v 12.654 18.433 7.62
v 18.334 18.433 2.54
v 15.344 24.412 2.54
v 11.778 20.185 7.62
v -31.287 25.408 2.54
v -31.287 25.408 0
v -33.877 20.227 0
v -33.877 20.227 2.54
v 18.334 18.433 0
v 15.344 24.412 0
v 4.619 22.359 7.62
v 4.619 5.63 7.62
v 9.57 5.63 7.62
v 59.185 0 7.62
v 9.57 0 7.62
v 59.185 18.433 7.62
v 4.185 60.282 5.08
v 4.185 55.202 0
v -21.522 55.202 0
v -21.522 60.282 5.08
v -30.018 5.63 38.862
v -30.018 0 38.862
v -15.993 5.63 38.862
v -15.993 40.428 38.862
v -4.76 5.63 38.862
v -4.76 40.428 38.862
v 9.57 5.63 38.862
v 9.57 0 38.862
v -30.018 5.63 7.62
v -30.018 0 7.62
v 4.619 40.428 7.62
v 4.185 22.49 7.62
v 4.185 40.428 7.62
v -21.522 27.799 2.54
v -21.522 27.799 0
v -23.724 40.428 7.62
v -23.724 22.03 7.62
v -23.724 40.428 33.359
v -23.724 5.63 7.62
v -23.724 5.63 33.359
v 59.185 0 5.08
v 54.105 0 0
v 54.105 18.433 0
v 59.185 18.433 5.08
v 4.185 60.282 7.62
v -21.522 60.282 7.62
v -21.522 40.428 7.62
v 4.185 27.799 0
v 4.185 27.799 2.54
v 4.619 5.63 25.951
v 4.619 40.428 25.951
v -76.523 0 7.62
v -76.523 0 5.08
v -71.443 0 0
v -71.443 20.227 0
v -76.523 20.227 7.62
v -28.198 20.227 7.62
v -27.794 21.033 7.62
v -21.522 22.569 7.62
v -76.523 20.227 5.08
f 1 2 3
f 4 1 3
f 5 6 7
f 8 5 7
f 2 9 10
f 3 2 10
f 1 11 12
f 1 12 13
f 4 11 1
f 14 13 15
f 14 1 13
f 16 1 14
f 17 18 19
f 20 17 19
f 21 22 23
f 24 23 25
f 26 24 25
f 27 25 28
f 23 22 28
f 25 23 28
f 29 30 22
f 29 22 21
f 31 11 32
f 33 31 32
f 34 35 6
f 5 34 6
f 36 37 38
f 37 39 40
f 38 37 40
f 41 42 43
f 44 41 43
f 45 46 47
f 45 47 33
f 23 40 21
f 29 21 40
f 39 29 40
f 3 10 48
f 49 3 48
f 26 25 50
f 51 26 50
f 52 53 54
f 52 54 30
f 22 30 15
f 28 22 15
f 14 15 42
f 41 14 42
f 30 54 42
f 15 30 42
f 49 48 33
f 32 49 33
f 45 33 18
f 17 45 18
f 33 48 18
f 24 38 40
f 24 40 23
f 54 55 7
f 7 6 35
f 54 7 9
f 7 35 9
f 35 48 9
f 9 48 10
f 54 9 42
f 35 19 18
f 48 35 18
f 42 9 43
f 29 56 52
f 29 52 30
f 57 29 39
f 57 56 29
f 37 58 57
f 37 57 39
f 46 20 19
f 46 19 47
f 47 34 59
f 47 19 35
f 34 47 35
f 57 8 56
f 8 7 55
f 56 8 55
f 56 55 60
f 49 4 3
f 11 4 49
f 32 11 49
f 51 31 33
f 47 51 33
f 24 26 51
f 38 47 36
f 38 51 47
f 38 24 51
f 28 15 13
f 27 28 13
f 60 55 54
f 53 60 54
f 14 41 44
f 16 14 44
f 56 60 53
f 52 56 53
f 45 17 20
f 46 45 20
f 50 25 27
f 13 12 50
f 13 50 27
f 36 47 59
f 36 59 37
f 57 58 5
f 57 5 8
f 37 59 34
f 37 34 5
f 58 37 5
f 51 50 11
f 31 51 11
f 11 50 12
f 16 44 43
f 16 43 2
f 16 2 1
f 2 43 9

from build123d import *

# Parameters (mm, degrees)
F1_DEPTH = 7.62
F2_SIZE  = 5.08
F3_W     = 39.5873952657
F3_H     = 5.6298854761
F4_DEPTH = 31.242
F6_DEPTH = 34.798


with BuildPart() as f1:
    # F0 (on Top) → F1 (new body)
    with BuildSketch(Plane.XY):
        Polygon((-76.5226408839, 20.2266871929), (-76.5226408839, 0), (59.1854825616, 0), (59.1854825616, 18.4331871569), (18.3335505426, 18.4331871569), (15.344383195, 24.4115199894), (4.1848318651, 27.7992393821), (4.1848318651, 60.2815076709), (-21.5219929814, 60.2815076709), (-21.5219929814, 27.7992393821), (-31.2866009772, 25.4079084843), (-33.8772125542, 20.2266871929), align=None)
    extrude(amount=F1_DEPTH)

    # F2
    f2_edges = [f1.edges().sort_by_distance(p)[0] for p in [
        (-26.404297, 26.603574, 7.62),
        (-32.581907, 22.817298, 7.62),
        (9.764608, 26.10538, 7.62),
        (16.838967, 21.422354, 7.62),
        (59.185483, 9.216594, 0),
        (-76.522641, 10.113344, 0),
        (-8.668581, 60.281508, 0),
    ]]
    chamfer(f2_edges, length=F2_SIZE)

    # F3 (on face) → F4 (join)
    with BuildSketch(Plane.XY.offset(7.62)):
        with Locations((-10.2241346613, 2.814942738)):
            Rectangle(F3_W, F3_H)
    extrude(amount=F4_DEPTH)

    # F5 (on face) → F6 (join)
    with BuildSketch(Plane(origin=(0, 5.6298854761, 0), x_dir=(-1, 0, 0), z_dir=(0, 1, 0))):
        Polygon((-4.6187778935, 25.9514674544), (-4.6187778935, 7.62), (0, 7.62), (0, 23.0201836675), (4.759604577, 29.3508209288), (15.9931536764, 29.3508209288), (19.8779646307, 25.9514674544), (19.8779646307, 7.62), (23.7236581743, 7.62), (23.7236581743, 33.3591811359), (15.9931536764, 38.862), (4.759604577, 38.862), align=None)
        Polygon((0, 23.0201836675), (0, 7.62), (19.8779646307, 7.62), (19.8779646307, 25.9514674544), (15.9931536764, 29.3508209288), (4.759604577, 29.3508209288), align=None)
    extrude(amount=F6_DEPTH)


solid = f1.part
